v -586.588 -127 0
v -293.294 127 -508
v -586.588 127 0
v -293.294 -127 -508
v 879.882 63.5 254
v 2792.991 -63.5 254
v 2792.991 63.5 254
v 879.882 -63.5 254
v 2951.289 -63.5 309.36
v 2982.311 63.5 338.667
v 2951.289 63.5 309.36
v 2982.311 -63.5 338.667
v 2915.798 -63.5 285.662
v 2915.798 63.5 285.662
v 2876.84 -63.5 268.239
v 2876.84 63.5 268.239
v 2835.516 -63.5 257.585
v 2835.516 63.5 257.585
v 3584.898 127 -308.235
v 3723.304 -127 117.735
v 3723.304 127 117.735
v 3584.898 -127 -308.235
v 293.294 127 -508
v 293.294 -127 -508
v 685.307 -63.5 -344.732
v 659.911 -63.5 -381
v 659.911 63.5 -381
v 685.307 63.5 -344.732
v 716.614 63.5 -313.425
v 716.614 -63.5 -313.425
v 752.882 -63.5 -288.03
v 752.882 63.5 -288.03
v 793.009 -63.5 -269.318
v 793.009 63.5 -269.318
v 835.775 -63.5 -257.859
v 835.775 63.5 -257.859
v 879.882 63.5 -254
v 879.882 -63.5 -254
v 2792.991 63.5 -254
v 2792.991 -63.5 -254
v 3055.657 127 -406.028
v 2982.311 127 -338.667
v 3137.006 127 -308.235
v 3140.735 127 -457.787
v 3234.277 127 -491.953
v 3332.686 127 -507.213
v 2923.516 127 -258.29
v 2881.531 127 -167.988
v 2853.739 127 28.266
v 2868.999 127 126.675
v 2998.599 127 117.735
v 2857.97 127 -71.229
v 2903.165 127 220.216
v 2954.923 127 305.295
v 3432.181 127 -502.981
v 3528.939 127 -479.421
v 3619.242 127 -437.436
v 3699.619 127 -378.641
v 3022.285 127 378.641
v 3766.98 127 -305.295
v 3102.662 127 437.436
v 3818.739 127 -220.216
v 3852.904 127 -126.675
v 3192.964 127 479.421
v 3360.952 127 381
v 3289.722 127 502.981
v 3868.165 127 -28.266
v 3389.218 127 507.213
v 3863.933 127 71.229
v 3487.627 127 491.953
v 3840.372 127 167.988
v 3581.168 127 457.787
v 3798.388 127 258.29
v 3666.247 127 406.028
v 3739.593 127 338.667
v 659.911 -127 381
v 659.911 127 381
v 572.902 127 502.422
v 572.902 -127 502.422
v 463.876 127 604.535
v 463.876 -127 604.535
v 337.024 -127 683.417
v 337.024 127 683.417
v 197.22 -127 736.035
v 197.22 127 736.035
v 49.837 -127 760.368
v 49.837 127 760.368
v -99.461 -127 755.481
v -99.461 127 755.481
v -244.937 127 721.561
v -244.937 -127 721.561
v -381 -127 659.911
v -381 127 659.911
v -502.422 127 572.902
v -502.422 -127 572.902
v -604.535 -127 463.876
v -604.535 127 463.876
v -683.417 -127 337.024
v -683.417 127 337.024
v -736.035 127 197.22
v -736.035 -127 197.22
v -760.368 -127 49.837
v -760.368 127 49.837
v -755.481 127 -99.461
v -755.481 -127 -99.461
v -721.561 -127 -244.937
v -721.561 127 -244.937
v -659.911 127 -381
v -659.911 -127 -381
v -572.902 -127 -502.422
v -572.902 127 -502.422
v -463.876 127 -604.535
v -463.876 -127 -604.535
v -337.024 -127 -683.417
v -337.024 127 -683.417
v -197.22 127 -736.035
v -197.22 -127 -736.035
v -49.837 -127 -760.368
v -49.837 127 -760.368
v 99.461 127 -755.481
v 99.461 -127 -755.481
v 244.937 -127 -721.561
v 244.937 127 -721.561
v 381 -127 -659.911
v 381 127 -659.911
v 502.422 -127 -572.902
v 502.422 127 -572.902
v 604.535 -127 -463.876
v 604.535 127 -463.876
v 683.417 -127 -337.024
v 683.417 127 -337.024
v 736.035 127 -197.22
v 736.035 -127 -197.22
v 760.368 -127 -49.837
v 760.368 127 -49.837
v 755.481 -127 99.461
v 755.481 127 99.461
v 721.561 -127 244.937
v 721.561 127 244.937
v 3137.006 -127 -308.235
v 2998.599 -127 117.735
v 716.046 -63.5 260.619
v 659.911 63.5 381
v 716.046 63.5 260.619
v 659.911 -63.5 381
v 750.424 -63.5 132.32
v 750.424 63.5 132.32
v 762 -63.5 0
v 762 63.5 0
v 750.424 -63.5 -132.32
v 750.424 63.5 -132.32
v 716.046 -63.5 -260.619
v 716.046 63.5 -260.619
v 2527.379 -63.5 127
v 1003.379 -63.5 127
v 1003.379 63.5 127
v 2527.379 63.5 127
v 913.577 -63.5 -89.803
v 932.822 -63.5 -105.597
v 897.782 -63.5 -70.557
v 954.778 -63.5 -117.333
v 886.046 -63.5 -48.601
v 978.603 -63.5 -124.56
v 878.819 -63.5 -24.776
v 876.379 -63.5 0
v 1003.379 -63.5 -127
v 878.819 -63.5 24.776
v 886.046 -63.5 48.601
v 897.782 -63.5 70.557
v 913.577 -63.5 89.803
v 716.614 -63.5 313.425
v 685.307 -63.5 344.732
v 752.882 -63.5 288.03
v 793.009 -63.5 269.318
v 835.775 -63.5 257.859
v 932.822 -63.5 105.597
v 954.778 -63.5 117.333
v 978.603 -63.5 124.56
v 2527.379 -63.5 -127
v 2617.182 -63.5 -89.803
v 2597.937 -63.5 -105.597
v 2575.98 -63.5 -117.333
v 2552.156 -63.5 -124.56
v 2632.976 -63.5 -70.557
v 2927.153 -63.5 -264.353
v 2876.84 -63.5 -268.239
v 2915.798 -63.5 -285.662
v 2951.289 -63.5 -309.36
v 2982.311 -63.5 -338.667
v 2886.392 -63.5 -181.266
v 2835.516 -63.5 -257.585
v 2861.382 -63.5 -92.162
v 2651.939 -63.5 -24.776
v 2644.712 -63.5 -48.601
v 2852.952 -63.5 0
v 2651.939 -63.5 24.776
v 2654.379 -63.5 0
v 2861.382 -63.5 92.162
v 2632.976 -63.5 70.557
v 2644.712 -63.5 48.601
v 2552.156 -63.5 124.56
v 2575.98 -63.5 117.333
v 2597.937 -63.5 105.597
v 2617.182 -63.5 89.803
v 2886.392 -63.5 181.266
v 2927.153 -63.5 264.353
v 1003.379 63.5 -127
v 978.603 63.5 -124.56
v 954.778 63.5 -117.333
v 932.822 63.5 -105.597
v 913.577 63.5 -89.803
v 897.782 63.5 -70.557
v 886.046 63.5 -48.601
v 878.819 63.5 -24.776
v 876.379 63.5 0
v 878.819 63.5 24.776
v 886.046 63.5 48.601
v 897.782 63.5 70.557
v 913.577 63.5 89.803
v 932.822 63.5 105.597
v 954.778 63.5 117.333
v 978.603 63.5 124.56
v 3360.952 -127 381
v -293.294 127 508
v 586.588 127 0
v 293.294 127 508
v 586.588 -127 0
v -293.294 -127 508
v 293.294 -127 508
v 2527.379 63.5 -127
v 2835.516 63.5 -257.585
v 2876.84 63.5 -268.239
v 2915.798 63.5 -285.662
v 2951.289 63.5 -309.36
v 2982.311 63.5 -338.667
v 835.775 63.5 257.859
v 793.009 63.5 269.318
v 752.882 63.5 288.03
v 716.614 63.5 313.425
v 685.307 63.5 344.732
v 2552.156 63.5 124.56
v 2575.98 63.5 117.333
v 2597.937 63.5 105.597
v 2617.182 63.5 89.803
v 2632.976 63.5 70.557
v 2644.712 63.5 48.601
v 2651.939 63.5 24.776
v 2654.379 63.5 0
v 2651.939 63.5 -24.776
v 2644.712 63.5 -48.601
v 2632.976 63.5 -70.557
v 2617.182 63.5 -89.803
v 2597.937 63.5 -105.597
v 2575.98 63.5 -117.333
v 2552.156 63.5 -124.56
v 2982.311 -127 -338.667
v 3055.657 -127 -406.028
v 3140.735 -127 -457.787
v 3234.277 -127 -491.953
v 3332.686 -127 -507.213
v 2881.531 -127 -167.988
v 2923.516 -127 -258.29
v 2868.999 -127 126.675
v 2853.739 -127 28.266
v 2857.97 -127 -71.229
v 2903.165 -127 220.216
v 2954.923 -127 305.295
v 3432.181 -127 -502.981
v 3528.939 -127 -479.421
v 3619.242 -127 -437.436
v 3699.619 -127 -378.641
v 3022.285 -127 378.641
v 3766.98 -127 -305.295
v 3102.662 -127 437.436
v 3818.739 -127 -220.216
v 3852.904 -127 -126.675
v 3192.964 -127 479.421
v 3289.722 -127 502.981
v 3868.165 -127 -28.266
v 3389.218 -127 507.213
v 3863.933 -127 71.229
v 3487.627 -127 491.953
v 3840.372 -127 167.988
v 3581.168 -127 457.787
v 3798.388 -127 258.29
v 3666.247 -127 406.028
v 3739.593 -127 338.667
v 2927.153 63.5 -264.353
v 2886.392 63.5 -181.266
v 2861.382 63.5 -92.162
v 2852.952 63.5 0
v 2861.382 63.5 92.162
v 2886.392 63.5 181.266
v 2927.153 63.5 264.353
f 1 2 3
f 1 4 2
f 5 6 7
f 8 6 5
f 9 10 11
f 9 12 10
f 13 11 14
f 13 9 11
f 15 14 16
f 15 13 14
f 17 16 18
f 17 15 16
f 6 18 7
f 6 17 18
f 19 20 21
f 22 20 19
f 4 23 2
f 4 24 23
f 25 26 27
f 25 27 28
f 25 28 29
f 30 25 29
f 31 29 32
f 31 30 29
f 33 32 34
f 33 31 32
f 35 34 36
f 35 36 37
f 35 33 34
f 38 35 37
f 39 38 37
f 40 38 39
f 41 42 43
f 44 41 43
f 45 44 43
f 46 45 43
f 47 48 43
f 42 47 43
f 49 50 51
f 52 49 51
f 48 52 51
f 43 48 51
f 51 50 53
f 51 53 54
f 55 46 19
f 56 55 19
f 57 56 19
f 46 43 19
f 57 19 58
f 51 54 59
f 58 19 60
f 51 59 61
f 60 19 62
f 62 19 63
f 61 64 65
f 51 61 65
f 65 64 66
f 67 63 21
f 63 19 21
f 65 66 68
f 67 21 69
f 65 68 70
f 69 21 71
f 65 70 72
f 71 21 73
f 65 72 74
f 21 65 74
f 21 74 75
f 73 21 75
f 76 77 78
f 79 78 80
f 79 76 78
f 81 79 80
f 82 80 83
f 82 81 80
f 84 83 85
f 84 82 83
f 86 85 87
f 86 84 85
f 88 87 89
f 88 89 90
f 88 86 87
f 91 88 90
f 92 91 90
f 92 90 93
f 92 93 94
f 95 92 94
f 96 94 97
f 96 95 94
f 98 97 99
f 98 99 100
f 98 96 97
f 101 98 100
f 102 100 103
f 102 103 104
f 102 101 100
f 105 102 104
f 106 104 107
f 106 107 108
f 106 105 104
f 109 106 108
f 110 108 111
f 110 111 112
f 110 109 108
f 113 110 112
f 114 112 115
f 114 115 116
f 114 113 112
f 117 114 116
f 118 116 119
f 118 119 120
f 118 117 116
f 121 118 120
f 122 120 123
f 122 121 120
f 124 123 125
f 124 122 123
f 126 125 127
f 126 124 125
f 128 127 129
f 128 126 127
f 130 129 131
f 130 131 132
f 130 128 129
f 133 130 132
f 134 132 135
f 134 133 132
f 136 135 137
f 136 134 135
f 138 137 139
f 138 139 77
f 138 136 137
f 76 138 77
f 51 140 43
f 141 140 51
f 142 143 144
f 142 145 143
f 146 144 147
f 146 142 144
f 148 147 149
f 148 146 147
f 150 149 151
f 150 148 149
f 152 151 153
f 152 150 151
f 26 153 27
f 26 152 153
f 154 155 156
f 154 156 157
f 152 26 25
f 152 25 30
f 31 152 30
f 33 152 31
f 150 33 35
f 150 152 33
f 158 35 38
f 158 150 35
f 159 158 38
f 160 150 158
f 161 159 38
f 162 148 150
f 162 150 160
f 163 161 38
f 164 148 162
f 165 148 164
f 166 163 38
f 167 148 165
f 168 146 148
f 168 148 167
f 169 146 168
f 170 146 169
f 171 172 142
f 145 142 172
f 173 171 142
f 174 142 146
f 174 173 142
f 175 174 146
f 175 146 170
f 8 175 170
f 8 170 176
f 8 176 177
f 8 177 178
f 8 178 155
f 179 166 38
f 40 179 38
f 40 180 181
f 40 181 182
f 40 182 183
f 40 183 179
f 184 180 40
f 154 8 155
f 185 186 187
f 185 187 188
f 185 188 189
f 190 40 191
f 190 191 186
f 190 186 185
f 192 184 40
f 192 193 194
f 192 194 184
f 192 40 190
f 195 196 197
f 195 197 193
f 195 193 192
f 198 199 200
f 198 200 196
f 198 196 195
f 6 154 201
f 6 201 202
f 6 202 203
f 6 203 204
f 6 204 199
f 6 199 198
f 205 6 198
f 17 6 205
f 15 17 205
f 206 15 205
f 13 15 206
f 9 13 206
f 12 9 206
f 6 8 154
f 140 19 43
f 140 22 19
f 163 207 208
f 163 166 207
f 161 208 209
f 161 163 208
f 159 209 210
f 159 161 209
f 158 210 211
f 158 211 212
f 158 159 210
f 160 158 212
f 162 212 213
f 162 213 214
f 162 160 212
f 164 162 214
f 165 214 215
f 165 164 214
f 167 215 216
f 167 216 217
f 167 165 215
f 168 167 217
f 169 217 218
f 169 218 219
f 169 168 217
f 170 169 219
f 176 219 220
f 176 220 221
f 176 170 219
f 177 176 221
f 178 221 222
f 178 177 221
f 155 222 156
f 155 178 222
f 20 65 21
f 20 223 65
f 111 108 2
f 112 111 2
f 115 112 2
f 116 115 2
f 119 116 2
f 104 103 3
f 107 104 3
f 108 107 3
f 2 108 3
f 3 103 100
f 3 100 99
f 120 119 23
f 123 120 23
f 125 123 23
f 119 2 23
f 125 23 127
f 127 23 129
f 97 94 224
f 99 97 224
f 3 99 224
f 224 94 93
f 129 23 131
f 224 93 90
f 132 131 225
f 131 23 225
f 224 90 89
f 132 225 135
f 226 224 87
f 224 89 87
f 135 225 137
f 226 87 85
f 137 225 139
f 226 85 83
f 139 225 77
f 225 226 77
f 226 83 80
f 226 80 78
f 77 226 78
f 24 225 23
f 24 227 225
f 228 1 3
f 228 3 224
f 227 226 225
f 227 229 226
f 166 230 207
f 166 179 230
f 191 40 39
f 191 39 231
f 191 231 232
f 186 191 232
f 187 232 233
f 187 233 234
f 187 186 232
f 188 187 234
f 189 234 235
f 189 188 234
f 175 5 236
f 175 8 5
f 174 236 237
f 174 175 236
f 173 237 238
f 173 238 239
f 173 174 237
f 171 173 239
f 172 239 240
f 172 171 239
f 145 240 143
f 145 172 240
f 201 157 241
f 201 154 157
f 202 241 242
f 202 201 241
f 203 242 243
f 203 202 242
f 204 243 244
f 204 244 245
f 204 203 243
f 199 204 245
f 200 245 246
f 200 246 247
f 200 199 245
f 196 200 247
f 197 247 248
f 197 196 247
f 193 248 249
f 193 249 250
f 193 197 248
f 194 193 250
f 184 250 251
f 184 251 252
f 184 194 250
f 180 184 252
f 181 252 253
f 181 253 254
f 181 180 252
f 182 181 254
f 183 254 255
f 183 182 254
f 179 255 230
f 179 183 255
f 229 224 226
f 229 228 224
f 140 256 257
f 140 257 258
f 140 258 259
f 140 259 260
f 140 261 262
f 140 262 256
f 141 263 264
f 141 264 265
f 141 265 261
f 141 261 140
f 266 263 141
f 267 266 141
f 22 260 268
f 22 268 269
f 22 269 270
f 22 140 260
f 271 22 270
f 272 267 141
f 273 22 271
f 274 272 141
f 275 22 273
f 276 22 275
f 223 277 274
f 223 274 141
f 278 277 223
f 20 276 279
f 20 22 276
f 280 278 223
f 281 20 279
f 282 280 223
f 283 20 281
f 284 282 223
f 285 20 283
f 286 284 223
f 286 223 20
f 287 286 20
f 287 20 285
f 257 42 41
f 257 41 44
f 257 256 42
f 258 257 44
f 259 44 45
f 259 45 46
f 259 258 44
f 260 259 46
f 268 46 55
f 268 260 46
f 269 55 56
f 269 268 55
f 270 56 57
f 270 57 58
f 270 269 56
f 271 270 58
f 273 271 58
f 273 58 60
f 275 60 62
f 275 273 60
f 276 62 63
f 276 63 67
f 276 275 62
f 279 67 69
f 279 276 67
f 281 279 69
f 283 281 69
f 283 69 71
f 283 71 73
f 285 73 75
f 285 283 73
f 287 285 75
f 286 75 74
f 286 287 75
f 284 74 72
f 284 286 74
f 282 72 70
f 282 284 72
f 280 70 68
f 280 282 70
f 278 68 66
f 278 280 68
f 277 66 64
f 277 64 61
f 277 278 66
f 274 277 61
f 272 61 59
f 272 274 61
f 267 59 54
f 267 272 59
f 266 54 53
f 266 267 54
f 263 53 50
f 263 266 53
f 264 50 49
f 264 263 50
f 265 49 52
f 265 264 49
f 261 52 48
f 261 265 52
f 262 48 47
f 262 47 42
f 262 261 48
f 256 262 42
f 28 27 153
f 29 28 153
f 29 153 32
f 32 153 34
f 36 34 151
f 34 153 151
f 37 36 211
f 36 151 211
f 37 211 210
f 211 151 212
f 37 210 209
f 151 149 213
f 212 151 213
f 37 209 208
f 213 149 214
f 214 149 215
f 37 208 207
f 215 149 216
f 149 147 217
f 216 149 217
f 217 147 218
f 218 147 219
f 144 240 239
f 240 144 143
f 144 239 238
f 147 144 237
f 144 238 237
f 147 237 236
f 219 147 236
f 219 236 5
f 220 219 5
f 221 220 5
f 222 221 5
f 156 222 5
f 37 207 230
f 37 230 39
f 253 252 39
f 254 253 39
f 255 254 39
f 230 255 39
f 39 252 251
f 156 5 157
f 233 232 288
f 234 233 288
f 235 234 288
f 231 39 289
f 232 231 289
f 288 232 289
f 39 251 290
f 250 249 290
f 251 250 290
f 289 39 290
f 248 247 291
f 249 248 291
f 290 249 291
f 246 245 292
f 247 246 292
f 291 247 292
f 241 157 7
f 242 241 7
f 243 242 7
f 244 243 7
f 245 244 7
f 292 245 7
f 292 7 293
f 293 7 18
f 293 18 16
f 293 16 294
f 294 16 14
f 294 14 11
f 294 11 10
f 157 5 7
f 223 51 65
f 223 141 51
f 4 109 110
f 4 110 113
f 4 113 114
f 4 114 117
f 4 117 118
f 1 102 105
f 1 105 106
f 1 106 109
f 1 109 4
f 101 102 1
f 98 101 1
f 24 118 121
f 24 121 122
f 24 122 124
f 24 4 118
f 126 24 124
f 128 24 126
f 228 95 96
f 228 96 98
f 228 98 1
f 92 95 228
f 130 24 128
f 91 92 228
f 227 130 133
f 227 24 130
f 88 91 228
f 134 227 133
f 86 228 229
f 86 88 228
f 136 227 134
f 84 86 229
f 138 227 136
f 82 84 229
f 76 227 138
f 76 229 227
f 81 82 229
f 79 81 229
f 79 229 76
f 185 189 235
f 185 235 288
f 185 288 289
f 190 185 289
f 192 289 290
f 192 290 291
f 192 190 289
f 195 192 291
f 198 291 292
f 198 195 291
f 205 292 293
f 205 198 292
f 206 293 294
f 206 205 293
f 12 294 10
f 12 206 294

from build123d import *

# Parameters (mm, degrees)
F1_DEPTH = 127
F2_DEPTH = 63.5


with BuildPart() as f1:
    # F0 (on Front) → F1 (new body, symmetric)
    with BuildSketch(Plane.XZ):
        with BuildLine():
            ThreePointArc((659.9113576837, -381), (736.0354796323, -197.2201123681), (762, 0))
            ThreePointArc((762, 0), (736.0354796323, 197.2201123681), (659.9113576837, 381))
            ThreePointArc((659.9113576837, 381), (-762, 0), (659.9113576837, -381))
        make_face()
        Polygon((-586.5878734967, 0), (-293.2939367483, 508), (293.2939367483, 508), (586.5878734967, 0), (293.2939367483, -508), (-293.2939367483, -508), align=None, mode=Mode.SUBTRACT)
    extrude(amount=F1_DEPTH, both=True)


with BuildPart() as f1b:
    # F0 (on Front) → F1, piece 2 (new body, symmetric)
    with BuildSketch(Plane.XZ):
        with BuildLine():
            ThreePointArc((3868.951848319, 0), (3542.2174699237, 474.5595583531), (2982.311004129, 338.6666666667))
            ThreePointArc((2982.311004129, 338.6666666667), (2852.951848319, 0), (2982.311004129, -338.6666666667))
            ThreePointArc((2982.311004129, -338.6666666667), (3542.2174699237, -474.5595583531), (3868.951848319, 0))
        make_face()
        Polygon((3723.3043810274, 117.7354748569), (3584.8980294424, -308.2354748569), (3137.0056671955, -308.2354748569), (2998.5993156105, 117.7354748569), (3360.951848319, 381), align=None, mode=Mode.SUBTRACT)
    extrude(amount=F1_DEPTH, both=True)


with BuildPart() as f2:
    # F0 (on Front) → F2 (new body, symmetric)
    with BuildSketch(Plane.XZ):
        with BuildLine():
            ThreePointArc((659.9113576837, 381), (736.0354796323, 197.2201123681), (762, 0))
            ThreePointArc((762, 0), (736.0354796323, -197.2201123681), (659.9113576837, -381))
            ThreePointArc((659.9113576837, -381), (752.881810245, -288.0295474388), (879.881810245, -254))
            Line((879.881810245, -254), (2792.990582034, -254))
            ThreePointArc((2792.990582034, -254), (2896.6856478119, -276.1307839895), (2982.311004129, -338.6666666667))
            ThreePointArc((2982.311004129, -338.6666666667), (2852.951848319, 0), (2982.311004129, 338.6666666667))
            ThreePointArc((2982.311004129, 338.6666666667), (2896.6856478119, 276.1307839895), (2792.990582034, 254))
            Line((2792.990582034, 254), (879.881810245, 254))
            ThreePointArc((879.881810245, 254), (752.881810245, 288.0295474388), (659.9113576837, 381))
        make_face()
        with BuildLine():
            Line((1003.3791101256, 127), (1765.3791101256, 127))
            Line((1765.3791101256, 127), (2527.3791101256, 127))
            ThreePointArc((2527.3791101256, 127), (2654.3791101256, 0), (2527.3791101256, -127))
            Line((2527.3791101256, -127), (1003.3791101256, -127))
            ThreePointArc((1003.3791101256, -127), (876.3791101256, 0), (1003.3791101256, 127))
        make_face(mode=Mode.SUBTRACT)
    extrude(amount=F2_DEPTH, both=True)


solid = Compound([f1.part, f1b.part, f2.part])
